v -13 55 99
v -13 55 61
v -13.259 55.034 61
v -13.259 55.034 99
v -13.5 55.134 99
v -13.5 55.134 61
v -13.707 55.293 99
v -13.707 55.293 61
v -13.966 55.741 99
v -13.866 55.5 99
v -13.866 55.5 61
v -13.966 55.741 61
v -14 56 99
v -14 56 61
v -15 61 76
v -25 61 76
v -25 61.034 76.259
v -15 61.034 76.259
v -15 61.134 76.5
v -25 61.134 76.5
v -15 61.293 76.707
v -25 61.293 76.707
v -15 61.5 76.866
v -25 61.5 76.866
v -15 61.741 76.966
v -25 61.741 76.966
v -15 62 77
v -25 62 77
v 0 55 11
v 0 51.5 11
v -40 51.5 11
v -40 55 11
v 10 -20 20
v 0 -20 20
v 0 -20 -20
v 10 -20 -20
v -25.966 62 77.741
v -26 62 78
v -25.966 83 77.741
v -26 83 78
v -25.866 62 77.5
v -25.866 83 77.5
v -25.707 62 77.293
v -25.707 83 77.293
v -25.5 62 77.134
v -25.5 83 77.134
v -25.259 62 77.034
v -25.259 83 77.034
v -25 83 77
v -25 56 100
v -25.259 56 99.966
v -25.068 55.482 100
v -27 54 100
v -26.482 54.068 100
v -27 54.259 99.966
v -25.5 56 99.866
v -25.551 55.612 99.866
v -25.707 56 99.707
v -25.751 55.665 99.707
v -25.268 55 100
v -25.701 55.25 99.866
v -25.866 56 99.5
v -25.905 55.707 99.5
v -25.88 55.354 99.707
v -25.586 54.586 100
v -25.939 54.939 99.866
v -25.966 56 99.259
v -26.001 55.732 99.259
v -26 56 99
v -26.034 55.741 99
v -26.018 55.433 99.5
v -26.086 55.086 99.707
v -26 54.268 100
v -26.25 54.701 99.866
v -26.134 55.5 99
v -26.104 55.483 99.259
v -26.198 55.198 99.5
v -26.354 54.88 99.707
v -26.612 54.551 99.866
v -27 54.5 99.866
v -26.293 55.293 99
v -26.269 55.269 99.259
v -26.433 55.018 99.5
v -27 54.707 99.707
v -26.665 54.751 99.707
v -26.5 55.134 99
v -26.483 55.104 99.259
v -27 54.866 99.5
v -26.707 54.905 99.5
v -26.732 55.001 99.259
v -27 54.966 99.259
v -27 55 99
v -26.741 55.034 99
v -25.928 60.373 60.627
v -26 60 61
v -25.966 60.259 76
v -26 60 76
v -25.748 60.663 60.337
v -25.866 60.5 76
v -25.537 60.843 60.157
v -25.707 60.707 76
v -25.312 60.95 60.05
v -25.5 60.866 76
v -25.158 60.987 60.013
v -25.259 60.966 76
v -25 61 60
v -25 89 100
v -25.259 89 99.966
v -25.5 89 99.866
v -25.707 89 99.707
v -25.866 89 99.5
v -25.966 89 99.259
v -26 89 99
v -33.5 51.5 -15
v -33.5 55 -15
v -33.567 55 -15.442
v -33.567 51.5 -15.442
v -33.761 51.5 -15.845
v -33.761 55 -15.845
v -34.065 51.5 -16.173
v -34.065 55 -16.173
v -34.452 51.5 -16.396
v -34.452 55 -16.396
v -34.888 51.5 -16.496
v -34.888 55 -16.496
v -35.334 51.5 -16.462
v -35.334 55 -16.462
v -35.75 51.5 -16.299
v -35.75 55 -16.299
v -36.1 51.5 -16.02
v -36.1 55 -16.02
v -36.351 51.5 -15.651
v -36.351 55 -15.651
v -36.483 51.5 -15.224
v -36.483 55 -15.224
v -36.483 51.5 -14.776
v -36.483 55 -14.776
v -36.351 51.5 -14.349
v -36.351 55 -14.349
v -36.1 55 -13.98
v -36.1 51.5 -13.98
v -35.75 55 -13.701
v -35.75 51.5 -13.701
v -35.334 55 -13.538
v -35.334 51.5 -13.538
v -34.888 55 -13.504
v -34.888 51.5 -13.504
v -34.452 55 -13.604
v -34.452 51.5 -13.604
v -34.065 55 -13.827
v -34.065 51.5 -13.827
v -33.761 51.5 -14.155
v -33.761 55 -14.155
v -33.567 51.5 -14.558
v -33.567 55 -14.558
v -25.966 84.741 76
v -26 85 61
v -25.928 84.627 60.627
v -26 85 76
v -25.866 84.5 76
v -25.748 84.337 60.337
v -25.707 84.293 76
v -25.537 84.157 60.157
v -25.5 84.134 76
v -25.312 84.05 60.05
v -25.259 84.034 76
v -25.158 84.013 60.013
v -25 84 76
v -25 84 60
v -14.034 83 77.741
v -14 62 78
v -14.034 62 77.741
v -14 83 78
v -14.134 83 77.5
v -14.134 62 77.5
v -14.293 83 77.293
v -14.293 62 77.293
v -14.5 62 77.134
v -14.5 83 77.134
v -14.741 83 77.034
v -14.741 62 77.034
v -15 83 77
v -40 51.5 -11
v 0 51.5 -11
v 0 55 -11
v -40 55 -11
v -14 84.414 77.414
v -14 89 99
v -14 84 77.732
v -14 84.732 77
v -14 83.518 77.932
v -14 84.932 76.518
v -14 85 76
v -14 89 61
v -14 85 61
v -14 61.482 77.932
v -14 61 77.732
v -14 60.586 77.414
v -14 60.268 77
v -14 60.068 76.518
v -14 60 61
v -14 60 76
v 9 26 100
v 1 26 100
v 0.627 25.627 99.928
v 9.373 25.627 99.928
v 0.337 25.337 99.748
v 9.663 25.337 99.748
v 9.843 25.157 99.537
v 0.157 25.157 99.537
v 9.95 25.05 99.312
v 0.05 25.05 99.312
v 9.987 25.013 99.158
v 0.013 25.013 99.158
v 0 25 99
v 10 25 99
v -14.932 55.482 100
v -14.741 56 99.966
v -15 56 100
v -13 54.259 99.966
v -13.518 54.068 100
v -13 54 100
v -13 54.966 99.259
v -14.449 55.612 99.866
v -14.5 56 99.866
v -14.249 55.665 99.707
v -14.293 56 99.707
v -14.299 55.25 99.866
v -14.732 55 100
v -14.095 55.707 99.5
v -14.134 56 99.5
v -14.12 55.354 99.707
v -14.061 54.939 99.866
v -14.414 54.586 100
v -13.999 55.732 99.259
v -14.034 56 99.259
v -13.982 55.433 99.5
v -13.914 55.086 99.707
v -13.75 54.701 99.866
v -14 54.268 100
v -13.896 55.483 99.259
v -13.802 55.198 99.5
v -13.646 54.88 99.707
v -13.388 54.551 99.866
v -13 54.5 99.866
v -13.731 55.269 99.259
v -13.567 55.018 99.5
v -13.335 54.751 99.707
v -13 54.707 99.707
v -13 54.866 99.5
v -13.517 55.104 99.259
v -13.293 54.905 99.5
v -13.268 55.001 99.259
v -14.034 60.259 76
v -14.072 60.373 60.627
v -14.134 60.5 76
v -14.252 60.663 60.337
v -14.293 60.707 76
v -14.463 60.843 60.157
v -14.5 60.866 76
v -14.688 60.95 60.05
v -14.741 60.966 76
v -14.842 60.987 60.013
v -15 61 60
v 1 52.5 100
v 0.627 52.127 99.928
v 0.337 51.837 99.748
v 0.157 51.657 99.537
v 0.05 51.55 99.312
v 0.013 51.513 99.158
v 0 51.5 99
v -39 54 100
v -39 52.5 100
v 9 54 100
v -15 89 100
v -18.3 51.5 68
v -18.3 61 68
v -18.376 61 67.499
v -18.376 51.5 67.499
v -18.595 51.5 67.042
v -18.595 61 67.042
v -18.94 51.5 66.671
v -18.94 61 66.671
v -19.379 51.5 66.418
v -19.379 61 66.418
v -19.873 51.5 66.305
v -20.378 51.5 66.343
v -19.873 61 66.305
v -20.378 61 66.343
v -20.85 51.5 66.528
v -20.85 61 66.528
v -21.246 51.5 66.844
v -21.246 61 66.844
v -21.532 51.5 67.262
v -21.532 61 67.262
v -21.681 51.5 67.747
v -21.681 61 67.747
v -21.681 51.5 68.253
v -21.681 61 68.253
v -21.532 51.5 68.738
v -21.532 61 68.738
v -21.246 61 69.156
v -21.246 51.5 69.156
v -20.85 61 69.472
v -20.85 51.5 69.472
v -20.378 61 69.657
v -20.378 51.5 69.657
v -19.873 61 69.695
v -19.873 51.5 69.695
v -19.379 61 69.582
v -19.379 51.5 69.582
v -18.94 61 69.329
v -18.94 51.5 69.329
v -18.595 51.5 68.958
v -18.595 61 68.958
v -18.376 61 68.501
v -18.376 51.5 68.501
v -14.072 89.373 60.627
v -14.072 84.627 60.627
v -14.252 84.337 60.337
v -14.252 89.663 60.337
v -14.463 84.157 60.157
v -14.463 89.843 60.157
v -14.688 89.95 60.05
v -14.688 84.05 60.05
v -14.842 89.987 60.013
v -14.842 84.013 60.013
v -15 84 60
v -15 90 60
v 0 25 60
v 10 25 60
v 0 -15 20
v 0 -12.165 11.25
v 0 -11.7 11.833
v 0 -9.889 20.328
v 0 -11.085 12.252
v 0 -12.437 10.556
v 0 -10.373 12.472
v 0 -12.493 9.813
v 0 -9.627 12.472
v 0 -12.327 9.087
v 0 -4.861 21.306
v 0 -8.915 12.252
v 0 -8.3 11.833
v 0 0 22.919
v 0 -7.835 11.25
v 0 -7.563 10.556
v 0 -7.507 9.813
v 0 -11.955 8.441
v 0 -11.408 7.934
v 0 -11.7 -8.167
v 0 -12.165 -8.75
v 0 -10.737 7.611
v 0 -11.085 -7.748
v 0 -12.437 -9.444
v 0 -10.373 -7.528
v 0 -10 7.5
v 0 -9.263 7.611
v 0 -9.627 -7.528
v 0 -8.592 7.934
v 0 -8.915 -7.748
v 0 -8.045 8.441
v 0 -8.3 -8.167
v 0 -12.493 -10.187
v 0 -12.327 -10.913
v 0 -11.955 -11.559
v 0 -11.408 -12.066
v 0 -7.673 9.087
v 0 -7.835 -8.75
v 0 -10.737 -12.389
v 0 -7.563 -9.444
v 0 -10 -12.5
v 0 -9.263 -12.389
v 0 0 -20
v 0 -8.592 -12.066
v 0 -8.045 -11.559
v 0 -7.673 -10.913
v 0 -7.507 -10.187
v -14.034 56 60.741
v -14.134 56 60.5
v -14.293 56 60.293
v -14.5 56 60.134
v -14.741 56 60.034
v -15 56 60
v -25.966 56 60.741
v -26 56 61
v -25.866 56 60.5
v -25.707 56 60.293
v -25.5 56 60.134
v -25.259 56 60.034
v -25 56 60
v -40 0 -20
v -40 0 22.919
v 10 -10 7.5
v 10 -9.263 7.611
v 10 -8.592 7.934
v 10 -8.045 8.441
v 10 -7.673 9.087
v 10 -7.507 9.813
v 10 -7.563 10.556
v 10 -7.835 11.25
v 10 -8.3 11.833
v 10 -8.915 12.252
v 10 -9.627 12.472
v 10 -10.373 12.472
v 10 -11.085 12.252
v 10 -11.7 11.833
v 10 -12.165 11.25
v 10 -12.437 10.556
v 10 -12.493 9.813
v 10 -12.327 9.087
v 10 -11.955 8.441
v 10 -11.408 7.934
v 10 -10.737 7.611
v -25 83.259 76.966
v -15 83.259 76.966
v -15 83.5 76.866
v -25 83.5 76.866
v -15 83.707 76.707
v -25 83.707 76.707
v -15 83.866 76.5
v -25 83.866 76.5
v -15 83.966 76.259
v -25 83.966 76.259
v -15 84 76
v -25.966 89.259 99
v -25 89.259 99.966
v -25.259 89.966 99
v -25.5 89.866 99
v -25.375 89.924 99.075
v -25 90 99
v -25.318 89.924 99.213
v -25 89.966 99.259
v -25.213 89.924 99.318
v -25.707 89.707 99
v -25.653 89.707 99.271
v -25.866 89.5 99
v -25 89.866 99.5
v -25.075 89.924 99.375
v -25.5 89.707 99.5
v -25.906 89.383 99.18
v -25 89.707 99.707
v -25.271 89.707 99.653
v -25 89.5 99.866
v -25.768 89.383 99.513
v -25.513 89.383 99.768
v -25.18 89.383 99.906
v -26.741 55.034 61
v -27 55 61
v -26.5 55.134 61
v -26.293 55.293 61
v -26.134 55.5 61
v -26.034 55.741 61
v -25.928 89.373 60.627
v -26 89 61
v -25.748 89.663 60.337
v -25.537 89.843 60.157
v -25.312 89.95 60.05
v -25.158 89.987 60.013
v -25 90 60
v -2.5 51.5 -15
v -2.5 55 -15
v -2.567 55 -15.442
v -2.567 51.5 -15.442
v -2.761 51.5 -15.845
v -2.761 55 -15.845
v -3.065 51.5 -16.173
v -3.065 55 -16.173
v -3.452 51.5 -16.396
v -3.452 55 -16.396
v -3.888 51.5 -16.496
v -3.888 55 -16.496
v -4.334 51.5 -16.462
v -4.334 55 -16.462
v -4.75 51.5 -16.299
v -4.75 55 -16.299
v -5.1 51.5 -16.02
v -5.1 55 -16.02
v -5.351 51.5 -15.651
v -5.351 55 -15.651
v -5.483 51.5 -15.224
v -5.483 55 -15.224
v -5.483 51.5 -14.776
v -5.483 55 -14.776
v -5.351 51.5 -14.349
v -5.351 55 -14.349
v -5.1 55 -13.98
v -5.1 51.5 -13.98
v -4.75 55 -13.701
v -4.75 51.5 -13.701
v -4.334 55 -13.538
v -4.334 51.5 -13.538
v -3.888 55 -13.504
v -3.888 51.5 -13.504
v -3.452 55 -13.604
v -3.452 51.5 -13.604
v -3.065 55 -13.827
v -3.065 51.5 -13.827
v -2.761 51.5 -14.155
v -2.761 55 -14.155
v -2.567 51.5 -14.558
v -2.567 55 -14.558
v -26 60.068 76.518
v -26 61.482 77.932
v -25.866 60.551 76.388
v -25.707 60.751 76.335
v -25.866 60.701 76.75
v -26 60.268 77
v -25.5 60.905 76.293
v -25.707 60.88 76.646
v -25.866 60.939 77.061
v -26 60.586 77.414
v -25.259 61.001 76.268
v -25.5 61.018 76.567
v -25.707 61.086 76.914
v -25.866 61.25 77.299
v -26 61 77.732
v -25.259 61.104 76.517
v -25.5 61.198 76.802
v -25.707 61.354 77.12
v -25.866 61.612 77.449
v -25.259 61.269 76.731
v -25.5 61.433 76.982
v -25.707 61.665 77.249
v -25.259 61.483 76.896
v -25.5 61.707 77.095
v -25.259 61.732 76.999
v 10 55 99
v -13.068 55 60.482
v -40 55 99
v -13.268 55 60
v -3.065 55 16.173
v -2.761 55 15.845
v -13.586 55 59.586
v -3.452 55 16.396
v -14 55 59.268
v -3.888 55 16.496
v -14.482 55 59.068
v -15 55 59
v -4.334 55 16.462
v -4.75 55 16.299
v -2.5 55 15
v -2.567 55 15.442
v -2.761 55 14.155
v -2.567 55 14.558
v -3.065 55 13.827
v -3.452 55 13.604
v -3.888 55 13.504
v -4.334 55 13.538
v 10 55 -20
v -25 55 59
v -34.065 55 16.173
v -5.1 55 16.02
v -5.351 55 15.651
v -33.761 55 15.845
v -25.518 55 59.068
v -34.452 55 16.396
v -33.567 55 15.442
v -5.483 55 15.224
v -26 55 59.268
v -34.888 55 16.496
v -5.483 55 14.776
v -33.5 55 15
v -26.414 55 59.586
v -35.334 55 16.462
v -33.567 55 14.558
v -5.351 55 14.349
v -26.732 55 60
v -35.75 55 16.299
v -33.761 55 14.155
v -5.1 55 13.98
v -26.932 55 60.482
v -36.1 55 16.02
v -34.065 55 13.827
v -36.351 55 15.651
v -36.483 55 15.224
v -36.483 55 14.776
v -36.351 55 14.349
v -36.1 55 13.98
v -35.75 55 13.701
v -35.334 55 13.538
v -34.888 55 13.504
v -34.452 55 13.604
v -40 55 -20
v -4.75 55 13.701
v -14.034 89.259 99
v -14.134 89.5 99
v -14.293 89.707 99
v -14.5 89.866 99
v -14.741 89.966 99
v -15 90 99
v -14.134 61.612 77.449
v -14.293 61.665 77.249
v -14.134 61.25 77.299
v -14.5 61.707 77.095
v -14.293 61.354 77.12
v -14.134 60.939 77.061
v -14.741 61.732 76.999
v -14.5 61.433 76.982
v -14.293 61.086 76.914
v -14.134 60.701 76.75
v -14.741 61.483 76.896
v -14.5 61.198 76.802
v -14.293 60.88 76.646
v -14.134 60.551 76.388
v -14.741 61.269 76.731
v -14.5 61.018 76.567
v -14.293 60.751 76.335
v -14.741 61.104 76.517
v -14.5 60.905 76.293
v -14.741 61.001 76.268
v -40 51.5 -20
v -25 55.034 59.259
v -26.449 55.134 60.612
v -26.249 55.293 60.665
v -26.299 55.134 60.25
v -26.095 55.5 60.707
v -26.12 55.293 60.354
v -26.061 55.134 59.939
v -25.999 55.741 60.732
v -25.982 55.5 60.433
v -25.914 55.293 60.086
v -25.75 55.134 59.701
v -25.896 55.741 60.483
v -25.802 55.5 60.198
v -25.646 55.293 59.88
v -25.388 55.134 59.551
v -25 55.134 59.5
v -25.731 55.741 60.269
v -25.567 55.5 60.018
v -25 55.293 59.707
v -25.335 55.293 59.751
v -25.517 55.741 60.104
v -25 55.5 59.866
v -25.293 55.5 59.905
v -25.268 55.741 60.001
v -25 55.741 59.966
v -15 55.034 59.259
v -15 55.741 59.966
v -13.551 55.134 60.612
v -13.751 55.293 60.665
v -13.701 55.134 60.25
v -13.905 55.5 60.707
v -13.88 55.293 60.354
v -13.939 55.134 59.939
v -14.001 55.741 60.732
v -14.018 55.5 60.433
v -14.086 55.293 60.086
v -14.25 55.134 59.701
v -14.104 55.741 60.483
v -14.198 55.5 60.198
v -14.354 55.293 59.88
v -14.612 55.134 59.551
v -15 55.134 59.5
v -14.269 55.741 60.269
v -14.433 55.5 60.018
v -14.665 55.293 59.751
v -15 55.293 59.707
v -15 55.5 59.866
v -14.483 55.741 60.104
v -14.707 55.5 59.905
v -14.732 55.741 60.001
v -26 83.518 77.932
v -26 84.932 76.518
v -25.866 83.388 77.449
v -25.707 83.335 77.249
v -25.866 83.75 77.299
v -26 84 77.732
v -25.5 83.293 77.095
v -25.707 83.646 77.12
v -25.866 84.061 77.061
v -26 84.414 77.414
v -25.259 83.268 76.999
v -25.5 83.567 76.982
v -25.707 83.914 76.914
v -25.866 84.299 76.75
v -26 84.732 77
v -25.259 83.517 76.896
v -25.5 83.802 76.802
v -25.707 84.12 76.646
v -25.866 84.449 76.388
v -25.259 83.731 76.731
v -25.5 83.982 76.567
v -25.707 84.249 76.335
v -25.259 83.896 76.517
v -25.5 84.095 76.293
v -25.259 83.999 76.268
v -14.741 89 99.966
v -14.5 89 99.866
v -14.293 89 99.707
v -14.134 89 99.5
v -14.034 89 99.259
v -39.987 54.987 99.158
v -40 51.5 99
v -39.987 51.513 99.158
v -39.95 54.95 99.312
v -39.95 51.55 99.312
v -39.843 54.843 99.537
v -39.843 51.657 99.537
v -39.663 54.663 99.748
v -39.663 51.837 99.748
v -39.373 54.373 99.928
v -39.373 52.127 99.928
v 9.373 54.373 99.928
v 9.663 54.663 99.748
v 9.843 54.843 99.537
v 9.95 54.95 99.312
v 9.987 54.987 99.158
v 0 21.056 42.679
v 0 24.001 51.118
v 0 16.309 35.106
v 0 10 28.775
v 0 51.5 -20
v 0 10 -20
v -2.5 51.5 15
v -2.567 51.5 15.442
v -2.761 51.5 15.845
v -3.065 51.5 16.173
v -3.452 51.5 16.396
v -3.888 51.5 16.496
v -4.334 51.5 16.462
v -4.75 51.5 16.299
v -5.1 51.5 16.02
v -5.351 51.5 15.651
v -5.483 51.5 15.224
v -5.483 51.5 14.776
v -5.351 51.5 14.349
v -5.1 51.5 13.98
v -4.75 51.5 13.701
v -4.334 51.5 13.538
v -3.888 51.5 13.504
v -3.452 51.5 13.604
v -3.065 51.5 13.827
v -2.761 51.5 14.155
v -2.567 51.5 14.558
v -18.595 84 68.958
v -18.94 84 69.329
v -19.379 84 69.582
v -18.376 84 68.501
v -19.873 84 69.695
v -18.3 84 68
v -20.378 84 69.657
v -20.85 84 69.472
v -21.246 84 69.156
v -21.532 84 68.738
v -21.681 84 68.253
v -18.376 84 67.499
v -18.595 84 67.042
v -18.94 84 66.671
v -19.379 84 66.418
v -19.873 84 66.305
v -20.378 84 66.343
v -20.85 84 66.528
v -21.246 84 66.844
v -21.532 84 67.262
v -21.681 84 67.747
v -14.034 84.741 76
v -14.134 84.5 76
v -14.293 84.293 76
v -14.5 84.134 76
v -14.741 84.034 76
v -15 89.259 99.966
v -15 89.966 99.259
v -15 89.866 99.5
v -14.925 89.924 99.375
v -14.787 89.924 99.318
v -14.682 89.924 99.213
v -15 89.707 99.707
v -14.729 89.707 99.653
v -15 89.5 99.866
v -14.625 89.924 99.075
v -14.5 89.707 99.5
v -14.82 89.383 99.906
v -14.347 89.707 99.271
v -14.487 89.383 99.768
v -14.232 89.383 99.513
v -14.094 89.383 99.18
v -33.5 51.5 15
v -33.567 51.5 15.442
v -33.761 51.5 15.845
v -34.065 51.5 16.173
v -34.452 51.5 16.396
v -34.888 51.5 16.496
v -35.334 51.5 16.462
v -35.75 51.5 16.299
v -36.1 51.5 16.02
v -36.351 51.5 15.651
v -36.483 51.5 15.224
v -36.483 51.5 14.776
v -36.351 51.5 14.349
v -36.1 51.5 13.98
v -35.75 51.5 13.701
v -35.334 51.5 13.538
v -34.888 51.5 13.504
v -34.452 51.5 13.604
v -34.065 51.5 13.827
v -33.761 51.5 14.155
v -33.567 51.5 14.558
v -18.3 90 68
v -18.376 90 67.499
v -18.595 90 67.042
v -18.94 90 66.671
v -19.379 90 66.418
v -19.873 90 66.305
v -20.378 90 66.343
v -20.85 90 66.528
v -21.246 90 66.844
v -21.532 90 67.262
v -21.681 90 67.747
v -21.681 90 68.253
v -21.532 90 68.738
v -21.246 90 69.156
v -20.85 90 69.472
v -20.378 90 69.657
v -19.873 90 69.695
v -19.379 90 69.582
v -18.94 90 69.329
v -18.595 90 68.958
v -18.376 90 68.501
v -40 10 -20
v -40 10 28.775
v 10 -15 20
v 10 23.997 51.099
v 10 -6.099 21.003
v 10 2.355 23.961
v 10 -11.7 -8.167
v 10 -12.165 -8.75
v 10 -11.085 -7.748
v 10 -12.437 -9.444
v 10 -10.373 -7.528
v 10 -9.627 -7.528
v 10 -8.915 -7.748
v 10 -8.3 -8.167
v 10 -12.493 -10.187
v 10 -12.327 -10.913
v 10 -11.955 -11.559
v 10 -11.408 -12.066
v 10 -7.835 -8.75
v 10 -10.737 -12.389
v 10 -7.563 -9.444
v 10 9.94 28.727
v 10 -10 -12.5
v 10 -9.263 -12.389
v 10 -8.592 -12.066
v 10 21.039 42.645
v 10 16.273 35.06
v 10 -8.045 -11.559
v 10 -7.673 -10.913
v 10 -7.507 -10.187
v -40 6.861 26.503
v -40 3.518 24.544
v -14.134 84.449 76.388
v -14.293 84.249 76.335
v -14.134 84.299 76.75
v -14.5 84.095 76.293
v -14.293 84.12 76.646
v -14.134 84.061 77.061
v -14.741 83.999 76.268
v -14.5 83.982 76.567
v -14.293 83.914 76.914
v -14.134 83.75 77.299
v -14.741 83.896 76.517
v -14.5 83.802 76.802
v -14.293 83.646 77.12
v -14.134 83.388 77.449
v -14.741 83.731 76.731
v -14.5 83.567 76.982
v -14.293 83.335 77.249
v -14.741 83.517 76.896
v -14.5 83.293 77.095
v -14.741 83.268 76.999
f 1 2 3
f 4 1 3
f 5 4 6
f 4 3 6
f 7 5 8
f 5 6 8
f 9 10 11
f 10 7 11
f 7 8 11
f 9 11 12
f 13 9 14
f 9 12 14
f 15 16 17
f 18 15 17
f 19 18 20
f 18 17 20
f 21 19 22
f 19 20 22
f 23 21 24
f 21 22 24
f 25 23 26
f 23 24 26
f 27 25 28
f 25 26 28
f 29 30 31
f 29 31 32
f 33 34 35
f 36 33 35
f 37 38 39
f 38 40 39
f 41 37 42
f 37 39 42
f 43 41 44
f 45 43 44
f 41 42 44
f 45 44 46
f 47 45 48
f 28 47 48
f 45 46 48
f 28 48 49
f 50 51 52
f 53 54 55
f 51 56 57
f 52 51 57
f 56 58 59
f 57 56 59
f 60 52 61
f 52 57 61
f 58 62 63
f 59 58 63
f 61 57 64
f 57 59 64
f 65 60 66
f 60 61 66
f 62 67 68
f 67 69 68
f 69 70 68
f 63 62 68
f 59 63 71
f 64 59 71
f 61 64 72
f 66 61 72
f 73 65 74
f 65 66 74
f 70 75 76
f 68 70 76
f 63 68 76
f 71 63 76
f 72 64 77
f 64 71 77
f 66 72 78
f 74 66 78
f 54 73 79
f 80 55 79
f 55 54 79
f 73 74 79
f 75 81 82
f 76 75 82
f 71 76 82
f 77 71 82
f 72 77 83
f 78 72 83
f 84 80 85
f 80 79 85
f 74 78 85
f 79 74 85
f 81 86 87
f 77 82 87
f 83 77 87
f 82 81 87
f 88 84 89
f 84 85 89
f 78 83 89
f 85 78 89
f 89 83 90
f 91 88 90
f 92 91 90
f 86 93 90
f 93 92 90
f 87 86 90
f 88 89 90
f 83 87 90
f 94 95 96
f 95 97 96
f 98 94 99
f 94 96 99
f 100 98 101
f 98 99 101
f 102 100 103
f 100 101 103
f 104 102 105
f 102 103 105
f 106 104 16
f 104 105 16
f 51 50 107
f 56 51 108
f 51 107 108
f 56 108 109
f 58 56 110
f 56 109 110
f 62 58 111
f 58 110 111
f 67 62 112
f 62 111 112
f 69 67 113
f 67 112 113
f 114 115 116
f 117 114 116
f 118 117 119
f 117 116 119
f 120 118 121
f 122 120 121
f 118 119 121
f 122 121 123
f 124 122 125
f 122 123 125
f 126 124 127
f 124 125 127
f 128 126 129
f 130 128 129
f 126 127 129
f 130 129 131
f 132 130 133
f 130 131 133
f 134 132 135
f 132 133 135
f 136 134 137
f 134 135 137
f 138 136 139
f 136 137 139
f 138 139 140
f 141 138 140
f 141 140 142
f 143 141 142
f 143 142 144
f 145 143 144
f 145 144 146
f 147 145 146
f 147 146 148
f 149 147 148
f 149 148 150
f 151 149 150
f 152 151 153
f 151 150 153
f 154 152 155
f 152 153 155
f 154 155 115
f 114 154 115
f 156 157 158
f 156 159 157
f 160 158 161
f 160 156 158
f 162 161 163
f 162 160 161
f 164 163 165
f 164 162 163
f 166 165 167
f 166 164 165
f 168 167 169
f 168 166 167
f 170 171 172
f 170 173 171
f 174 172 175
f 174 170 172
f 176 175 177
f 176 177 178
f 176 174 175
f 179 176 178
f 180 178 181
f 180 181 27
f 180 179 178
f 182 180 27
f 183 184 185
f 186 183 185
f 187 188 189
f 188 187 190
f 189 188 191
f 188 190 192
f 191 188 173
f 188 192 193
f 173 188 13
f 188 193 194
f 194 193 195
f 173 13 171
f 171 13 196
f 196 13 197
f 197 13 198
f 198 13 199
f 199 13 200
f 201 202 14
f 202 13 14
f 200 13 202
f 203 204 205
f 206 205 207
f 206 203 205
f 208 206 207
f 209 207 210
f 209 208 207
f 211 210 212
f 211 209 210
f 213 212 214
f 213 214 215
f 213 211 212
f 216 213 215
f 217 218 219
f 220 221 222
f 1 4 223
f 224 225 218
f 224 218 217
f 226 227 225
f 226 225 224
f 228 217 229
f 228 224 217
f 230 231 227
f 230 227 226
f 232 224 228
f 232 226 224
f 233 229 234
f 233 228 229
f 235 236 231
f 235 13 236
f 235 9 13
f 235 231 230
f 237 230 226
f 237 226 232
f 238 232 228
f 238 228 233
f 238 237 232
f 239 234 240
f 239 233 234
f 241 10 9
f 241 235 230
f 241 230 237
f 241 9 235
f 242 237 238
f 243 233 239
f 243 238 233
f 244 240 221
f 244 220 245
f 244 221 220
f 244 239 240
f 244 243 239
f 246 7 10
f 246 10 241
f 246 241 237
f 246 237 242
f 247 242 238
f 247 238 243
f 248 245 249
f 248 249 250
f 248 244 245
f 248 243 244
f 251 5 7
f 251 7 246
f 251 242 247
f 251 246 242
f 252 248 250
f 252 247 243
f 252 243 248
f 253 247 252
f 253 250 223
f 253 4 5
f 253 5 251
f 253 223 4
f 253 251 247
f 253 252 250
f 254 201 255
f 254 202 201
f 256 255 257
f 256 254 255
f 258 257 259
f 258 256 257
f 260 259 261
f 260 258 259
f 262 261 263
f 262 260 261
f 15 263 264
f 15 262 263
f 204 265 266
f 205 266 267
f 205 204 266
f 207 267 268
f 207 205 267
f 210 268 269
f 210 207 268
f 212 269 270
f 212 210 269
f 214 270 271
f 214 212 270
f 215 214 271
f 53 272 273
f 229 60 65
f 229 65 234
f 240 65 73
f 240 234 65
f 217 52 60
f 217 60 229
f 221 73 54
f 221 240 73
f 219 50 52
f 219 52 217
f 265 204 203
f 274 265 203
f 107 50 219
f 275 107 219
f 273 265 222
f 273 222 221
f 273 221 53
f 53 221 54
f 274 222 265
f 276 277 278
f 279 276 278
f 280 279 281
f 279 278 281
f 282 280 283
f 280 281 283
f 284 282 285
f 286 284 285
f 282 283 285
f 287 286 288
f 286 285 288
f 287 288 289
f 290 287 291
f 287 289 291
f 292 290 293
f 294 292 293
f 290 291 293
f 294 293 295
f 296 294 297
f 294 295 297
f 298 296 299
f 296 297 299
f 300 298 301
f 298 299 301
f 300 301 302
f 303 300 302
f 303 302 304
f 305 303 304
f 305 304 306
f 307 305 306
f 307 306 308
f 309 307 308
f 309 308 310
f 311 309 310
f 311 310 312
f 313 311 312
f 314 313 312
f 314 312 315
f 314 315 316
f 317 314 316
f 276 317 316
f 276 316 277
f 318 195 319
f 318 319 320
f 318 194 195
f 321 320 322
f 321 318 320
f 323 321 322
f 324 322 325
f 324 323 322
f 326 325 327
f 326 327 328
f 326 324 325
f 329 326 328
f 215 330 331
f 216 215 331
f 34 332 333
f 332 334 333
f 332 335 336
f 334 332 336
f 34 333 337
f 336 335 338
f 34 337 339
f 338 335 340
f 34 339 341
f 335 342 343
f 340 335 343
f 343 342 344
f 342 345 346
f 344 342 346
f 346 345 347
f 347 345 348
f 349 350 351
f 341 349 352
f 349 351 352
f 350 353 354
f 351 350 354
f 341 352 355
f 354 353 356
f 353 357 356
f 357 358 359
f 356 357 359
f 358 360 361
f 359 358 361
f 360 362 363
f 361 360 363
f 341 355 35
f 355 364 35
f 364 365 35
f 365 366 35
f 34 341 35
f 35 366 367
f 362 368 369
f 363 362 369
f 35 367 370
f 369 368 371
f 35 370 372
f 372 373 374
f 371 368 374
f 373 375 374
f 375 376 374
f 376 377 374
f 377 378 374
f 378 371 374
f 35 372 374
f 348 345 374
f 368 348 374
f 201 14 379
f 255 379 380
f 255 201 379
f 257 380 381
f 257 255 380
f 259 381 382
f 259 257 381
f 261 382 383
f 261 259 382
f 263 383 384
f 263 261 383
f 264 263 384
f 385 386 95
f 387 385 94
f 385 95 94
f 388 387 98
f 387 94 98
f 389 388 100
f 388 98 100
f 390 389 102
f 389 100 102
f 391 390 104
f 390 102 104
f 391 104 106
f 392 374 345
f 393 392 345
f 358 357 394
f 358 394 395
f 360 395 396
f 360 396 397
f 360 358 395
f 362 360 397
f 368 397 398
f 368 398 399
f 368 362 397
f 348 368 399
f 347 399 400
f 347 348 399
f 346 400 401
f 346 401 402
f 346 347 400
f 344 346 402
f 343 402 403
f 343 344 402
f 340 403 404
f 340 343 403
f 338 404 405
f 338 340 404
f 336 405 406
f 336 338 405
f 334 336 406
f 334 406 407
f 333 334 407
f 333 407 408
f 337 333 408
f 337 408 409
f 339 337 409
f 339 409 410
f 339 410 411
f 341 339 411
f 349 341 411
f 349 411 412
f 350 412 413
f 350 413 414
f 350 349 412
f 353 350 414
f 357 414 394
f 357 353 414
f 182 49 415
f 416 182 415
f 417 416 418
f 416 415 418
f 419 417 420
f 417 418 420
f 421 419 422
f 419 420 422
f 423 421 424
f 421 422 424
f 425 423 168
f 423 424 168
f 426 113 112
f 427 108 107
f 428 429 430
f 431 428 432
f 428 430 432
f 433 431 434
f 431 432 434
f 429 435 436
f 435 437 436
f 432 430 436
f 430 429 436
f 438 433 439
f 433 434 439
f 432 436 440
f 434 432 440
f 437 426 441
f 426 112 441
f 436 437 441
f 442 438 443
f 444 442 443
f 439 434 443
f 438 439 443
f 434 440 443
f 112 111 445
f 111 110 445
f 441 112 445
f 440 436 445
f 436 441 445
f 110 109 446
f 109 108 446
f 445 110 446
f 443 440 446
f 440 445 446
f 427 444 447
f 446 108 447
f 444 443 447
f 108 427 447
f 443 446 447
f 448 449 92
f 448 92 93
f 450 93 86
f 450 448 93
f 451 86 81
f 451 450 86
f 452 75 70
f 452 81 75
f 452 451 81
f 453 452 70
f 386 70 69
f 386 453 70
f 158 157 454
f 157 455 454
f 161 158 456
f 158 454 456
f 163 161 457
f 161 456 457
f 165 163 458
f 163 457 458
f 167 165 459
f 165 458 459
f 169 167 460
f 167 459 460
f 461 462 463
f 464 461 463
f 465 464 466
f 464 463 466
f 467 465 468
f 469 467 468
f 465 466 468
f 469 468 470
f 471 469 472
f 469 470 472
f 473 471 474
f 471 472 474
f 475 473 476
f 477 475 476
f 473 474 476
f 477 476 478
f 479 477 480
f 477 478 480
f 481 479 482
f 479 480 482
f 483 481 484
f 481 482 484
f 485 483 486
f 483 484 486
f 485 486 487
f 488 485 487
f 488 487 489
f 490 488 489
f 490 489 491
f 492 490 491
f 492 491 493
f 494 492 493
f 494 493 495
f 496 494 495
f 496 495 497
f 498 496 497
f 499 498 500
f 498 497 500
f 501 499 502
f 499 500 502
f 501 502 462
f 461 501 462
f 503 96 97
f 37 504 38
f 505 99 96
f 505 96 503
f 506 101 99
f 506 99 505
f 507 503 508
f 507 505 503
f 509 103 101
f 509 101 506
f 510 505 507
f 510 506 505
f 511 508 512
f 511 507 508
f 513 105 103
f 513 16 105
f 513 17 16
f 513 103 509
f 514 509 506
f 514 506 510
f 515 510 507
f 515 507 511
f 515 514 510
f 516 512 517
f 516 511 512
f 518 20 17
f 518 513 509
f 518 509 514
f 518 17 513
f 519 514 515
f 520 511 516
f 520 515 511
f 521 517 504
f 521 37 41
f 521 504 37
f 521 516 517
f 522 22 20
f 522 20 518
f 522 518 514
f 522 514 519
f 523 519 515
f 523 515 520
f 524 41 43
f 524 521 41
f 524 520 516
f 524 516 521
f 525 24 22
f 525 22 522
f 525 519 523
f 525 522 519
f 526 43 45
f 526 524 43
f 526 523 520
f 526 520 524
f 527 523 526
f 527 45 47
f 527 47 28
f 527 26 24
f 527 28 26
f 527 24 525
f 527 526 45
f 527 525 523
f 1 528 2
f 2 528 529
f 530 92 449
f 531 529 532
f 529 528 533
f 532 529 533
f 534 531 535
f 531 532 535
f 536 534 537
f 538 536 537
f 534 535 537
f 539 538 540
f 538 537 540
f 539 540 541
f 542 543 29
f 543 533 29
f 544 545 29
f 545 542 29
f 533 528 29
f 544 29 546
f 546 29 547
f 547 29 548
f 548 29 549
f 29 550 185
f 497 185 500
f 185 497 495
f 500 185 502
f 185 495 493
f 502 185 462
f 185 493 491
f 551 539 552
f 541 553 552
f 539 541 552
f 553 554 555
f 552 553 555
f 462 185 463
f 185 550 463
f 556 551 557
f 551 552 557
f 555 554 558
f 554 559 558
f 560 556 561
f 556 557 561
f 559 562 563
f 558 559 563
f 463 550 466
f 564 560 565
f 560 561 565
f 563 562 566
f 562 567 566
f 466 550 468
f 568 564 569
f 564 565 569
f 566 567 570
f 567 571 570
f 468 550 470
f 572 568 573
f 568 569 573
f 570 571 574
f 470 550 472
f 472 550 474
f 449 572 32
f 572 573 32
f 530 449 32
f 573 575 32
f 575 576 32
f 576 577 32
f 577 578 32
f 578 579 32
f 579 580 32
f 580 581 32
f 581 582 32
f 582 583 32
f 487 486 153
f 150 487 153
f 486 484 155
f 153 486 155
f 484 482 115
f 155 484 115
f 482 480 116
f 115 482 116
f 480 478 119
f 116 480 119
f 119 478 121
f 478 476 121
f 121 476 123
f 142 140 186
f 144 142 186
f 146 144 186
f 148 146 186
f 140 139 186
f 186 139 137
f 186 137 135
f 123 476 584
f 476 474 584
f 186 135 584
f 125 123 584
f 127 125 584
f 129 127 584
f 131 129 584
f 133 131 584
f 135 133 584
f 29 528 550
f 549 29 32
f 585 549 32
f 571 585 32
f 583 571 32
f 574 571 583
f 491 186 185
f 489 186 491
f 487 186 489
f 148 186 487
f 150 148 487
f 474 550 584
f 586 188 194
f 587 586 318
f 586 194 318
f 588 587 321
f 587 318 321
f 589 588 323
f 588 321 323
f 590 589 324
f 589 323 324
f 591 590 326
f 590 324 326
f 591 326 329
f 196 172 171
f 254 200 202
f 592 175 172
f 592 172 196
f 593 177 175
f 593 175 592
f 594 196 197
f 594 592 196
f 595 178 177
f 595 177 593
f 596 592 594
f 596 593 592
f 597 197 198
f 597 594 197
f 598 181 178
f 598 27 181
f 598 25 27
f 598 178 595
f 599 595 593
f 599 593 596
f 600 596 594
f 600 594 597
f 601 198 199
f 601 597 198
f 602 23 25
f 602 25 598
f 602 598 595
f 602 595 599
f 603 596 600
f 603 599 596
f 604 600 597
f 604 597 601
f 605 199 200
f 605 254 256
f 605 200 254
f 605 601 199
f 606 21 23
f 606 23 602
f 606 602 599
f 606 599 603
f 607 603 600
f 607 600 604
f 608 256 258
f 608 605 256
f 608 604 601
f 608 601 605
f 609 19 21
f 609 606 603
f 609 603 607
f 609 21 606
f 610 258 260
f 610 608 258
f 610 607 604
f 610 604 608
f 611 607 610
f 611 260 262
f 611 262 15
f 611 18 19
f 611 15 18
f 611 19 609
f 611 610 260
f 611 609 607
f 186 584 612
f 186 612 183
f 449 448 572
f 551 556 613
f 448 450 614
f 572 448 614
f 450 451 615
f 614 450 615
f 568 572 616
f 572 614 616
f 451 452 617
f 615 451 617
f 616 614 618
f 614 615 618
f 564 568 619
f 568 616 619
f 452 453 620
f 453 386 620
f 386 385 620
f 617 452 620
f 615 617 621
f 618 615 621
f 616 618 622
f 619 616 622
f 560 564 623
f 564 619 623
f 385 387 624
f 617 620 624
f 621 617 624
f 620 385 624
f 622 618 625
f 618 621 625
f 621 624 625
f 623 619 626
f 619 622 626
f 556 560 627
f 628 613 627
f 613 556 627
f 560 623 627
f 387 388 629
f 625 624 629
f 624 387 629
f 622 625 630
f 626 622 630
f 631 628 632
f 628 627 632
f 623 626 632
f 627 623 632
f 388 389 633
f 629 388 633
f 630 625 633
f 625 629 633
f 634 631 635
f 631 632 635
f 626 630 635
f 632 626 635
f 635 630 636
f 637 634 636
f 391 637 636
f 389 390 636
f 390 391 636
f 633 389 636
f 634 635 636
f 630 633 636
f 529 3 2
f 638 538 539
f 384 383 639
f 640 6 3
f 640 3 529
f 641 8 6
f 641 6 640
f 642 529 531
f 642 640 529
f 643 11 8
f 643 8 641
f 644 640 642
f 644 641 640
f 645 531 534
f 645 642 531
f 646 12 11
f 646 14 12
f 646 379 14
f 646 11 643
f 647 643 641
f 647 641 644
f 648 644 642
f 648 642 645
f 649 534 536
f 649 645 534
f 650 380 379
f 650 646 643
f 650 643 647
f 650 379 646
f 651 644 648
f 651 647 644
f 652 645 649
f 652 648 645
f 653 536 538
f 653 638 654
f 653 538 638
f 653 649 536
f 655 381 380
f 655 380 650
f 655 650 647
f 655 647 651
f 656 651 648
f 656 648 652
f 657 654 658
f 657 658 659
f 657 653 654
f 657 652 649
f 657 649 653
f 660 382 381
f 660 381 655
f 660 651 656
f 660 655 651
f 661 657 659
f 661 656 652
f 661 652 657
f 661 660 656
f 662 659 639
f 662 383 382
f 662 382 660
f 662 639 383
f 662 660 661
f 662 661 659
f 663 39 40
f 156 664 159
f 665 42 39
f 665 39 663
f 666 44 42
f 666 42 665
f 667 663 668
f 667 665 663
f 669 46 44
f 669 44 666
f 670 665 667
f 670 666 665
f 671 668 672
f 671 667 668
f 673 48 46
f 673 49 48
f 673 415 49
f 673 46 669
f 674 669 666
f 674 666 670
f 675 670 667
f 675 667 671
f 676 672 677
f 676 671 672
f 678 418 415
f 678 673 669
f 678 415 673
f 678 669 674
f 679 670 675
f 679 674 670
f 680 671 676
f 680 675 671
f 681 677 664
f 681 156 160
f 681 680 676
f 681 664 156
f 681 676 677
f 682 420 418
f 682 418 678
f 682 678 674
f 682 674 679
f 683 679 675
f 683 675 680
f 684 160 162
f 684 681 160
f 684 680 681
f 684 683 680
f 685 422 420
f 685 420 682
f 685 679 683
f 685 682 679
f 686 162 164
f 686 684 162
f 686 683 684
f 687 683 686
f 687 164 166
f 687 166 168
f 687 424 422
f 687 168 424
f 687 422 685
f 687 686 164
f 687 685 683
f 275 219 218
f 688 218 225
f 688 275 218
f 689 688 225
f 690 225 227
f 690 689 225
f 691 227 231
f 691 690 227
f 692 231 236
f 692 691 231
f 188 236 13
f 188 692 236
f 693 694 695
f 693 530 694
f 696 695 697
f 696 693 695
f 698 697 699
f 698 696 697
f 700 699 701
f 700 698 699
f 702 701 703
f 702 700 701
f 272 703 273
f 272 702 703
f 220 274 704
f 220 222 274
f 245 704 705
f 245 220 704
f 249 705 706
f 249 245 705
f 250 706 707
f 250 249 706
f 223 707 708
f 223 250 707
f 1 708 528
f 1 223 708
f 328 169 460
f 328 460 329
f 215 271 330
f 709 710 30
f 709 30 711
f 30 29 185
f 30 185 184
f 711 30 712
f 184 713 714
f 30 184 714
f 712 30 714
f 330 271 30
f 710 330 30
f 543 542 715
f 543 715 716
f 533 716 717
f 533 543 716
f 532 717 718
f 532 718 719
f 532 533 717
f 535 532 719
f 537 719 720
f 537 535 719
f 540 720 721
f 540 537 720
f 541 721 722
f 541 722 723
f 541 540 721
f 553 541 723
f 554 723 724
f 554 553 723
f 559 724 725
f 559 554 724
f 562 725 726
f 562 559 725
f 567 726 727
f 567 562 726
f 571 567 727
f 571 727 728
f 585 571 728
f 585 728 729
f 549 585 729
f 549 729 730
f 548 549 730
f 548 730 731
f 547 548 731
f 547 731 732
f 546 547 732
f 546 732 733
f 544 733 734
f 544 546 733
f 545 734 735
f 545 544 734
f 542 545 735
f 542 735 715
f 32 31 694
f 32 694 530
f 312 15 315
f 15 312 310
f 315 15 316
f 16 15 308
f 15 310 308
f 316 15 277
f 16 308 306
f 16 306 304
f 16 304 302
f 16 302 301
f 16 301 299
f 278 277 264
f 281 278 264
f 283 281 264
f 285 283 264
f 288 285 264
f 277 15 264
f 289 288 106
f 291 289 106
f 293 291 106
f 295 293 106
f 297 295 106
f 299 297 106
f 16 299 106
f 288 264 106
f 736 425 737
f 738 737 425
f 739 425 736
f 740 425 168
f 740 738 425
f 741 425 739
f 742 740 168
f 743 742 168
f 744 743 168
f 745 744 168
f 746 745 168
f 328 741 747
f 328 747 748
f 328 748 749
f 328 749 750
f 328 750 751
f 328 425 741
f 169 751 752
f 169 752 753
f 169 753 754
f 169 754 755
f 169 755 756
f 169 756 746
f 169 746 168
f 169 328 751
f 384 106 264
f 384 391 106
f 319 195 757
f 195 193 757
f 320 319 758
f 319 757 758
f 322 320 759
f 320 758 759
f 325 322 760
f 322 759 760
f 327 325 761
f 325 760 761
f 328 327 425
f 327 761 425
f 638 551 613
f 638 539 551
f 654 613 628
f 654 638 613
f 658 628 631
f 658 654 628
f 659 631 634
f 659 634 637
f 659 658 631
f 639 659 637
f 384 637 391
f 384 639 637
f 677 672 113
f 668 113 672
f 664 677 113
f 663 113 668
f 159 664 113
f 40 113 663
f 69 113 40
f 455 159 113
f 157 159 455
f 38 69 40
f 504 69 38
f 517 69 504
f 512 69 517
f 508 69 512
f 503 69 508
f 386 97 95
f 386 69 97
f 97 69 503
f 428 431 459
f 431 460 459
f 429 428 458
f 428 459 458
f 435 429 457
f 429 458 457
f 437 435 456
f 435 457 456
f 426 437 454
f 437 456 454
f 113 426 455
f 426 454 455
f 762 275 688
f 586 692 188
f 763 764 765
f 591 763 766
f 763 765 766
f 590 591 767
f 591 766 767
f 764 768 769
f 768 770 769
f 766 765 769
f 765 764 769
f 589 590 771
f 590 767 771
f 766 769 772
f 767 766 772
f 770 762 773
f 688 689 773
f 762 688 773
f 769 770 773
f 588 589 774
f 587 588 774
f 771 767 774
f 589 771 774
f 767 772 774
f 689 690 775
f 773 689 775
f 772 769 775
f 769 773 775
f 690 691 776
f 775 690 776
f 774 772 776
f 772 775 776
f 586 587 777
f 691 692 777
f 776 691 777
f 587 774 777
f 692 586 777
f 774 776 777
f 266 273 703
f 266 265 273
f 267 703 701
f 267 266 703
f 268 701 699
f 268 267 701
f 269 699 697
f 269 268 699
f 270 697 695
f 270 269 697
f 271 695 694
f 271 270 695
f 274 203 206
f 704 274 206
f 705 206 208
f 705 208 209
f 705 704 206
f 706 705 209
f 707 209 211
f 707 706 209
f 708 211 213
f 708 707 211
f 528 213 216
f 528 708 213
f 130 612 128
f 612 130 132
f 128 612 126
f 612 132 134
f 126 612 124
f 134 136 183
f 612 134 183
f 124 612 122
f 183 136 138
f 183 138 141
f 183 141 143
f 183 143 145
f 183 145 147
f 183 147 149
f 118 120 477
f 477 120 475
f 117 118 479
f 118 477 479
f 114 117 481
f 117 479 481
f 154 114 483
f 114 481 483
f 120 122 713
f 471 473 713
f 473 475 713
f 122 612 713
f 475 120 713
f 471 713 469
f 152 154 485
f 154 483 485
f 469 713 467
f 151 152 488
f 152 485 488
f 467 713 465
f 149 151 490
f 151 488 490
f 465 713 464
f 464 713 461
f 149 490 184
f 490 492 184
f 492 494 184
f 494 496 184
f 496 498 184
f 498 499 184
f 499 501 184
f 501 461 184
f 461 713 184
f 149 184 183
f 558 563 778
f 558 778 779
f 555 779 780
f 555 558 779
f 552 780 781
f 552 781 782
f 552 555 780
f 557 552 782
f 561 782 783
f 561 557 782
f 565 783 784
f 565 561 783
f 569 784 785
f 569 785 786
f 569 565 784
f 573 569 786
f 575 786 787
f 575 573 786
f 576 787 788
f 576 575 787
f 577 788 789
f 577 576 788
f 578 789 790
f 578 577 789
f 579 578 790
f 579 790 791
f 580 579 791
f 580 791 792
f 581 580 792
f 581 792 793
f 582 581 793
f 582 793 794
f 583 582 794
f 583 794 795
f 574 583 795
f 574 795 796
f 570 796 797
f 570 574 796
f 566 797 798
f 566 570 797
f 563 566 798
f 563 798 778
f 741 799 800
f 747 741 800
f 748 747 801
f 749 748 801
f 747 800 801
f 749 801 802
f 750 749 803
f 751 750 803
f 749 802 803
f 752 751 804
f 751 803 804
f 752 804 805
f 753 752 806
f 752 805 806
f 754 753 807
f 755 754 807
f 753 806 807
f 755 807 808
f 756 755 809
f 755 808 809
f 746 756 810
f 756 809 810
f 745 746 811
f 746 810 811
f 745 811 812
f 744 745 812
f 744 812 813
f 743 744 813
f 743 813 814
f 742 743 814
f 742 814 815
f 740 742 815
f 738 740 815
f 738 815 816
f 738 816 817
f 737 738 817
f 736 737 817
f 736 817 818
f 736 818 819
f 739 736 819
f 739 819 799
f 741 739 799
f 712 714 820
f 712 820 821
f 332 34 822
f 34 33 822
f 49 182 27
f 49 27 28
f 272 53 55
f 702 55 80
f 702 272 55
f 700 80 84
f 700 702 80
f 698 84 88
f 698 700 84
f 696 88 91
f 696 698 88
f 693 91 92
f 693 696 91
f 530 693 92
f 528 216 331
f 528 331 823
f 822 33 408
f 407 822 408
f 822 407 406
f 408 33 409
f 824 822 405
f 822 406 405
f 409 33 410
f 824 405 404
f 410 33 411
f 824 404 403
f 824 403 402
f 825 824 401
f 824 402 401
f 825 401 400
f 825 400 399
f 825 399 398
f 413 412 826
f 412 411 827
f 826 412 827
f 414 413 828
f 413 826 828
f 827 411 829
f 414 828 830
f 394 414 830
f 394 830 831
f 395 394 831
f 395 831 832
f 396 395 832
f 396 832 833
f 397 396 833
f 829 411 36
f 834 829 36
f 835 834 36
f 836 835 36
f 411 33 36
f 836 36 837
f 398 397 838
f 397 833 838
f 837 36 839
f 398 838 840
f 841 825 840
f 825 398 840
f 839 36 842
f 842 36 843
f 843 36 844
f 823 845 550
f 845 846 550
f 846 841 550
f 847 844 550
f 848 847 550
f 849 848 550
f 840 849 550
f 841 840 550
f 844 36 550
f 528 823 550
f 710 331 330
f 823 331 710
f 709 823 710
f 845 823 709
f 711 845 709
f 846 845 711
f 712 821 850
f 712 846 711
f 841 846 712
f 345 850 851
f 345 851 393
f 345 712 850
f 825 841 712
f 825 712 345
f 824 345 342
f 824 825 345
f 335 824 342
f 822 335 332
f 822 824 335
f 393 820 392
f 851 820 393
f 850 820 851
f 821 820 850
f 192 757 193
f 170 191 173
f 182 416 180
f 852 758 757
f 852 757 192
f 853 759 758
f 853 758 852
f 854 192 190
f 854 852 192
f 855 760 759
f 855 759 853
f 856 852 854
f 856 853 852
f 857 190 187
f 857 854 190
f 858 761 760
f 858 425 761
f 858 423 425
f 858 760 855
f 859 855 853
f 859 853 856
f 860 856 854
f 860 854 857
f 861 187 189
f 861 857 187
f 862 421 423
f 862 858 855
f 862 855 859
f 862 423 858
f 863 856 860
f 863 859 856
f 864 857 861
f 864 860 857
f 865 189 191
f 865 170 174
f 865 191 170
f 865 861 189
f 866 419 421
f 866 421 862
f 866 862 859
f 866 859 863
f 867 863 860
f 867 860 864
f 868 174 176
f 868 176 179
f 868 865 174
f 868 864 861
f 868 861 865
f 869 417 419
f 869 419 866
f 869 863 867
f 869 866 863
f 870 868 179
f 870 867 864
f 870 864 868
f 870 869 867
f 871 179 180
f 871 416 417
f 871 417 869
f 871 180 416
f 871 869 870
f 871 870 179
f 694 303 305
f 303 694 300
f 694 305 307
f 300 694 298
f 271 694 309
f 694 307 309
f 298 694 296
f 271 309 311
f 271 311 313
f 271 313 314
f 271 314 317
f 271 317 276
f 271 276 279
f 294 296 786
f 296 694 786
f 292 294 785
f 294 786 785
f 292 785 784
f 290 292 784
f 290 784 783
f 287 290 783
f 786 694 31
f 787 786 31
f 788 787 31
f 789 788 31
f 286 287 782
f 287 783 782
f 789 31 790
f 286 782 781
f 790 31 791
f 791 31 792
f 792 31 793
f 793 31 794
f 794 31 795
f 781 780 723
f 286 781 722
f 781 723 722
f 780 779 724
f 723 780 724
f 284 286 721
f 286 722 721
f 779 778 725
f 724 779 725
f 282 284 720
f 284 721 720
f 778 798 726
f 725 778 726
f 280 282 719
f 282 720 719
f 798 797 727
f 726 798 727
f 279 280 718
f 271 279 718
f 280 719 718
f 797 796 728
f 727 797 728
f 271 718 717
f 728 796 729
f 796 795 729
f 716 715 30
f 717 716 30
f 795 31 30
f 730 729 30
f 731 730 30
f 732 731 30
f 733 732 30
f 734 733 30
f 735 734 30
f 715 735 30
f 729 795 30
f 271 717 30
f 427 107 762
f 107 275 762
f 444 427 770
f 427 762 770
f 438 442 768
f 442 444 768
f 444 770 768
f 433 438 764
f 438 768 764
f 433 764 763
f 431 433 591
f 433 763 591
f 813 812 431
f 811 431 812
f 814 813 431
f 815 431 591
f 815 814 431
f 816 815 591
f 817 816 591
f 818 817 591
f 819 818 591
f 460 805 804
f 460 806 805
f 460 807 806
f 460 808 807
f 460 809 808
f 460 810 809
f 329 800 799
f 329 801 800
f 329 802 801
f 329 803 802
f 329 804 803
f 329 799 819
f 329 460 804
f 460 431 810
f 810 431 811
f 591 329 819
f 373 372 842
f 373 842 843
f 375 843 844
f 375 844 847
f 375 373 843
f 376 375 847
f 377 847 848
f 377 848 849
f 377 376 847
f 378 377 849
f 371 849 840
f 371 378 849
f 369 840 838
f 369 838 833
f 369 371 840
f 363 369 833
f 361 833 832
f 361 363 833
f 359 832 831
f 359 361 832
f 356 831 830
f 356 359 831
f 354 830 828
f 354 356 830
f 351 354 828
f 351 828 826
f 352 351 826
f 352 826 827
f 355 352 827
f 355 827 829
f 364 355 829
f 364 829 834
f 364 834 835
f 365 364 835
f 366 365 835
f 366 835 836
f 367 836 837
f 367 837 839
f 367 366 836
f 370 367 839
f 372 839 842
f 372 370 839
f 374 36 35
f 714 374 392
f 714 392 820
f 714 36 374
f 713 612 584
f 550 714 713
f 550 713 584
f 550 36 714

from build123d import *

# Parameters (mm, degrees)
SKETCH1_W               = 40
SKETCH1_H               = 55
SKETCH1_H_2             = 20
SKETCH1_R               = 2.5
BOSS_EXTRUDE1_DEPTH     = 10
SKETCH3_W               = 40
SKETCH3_H               = 10
BOSS_EXTRUDE2_DEPTH     = 40
SKETCH4_W               = 9
SKETCH4_H               = 3.5
BOSS_EXTRUDE3_DEPTH     = 40
SKETCH5_R               = 1.5
CUT_EXTRUDE1_DEPTH      = 3.5
SKETCH7_W               = 40
SKETCH7_H               = 3.5
BOSS_EXTRUDE4_DEPTH     = 80
SKETCH8_W               = 12
SKETCH8_H               = 40
BOSS_EXTRUDE5_DEPTH     = 35
SKETCH9_W               = 12
SKETCH9_H               = 23
CUT_EXTRUDE2_DEPTH      = 17
SKETCH10_R              = 1.7
CUT_EXTRUDE3_DEPTH      = 1
CUT_EXTRUDE3_DEPTH_BACK = 38.5
FILLET1_R               = 1
FILLET2_R               = 40


with BuildPart() as part:
    # Sketch1 → Boss-Extrude1 (new body)
    with BuildSketch(Plane(origin=(0, 0, 0), x_dir=(0, 0, -1), z_dir=(1, 0, 0))):
        with Locations((0, 27.5)):
            Rectangle(SKETCH1_W, SKETCH1_H)
        with Locations((0, -10)):
            Rectangle(SKETCH1_W, SKETCH1_H_2)
        with Locations((10, -10)):
            Circle(SKETCH1_R, mode=Mode.SUBTRACT)
        with Locations((-10, -10)):
            Circle(SKETCH1_R, mode=Mode.SUBTRACT)
    extrude(amount=BOSS_EXTRUDE1_DEPTH)

    # Sketch3 → Boss-Extrude2 (add)
    with BuildSketch(Plane.ZY):
        with Locations((0, 5)):
            Rectangle(SKETCH3_W, SKETCH3_H)
    extrude(amount=BOSS_EXTRUDE2_DEPTH)

    # Sketch4 → Boss-Extrude3 (add)
    with BuildSketch(Plane.ZY):
        with Locations((-15.5, 53.25)):
            Rectangle(SKETCH4_W, SKETCH4_H)
    boss_extrude3 = extrude(amount=BOSS_EXTRUDE3_DEPTH)

    # Sketch5 → Cut-Extrude1 (cut)
    with BuildSketch(Plane(origin=(0, 55, 0), x_dir=(1, 0, 0), z_dir=(0, 1, 0))):
        with Locations((-35, 15)):
            Circle(SKETCH5_R)
        with Locations((-4, 15)):
            Circle(SKETCH5_R)
    cut_extrude1 = extrude(amount=-CUT_EXTRUDE1_DEPTH, mode=Mode.SUBTRACT)

    # Mirror2: Boss-Extrude3, Cut-Extrude1 across plane
    add(boss_extrude3.mirror(Plane.XY))
    add(cut_extrude1.mirror(Plane.XY), mode=Mode.SUBTRACT)

    # Sketch7 → Boss-Extrude4 (add)
    with BuildSketch(Plane.XY.offset(20)):
        with Locations((-20, 53.25)):
            Rectangle(SKETCH7_W, SKETCH7_H)
        Polygon((10, 55), (0, 55), (0, 51.5), (0, 25), (10, 25), align=None)
    extrude(amount=BOSS_EXTRUDE4_DEPTH)

    # Sketch8 → Boss-Extrude5 (add)
    with BuildSketch(Plane(origin=(0, 55, 0), x_dir=(1, 0, 0), z_dir=(0, 1, 0))):
        with Locations((-20, -80)):
            Rectangle(SKETCH8_W, SKETCH8_H)
    extrude(amount=BOSS_EXTRUDE5_DEPTH)

    # Sketch9 → Cut-Extrude2 (cut)
    with BuildSketch(Plane(origin=(0, 0, 60), x_dir=(-1, 0, 0), z_dir=(0, 0, -1))):
        with Locations((20, 72.5)):
            Rectangle(SKETCH9_W, SKETCH9_H)
    extrude(amount=-CUT_EXTRUDE2_DEPTH, mode=Mode.SUBTRACT)

    # Sketch10 → Cut-Extrude3 (cut, two sides)
    with BuildSketch(Plane(origin=(0, 90, 0), x_dir=(1, 0, 0), z_dir=(0, 1, 0))) as cut_extrude3_sk:
        with Locations((-20, -68)):
            Circle(SKETCH10_R)
    extrude(amount=CUT_EXTRUDE3_DEPTH, mode=Mode.SUBTRACT)
    extrude(cut_extrude3_sk.sketch, amount=-CUT_EXTRUDE3_DEPTH_BACK, mode=Mode.SUBTRACT)

    # Fillet1
    fillet1_edges = [part.edges().sort_by_distance(p)[0] for p in [
        (-33, 55, 100),
        (-26, 55, 80),
        (-26, 87, 60),
        (-26, 72.5, 100),
        (-14, 55, 80),
        (-14, 72.5, 100),
        (-20, 55, 60),
        (-14, 87, 60),
        (-26, 90, 80),
        (-20, 90, 100),
        (-14, 90, 80),
        (-26, 58, 60),
        (-14, 58, 60),
        (-14, 72.5, 77),
        (-14, 61, 68.5),
        (-20, 84, 77),
        (-14, 84, 68.5),
        (-26, 72.5, 77),
        (-26, 84, 68.5),
        (-20, 61, 77),
        (-26, 61, 68.5),
        (-20, 51.5, 100),
        (0, 38.25, 100),
        (5, 25, 100),
        (10, 40, 100),
        (-2, 55, 100),
        (-40, 53.25, 100),
    ]]
    fillet(fillet1_edges, radius=FILLET1_R)

    # Fillet2
    fillet2_edges = [part.edges().sort_by_distance(p)[0] for p in [
        (5, 25, 20),
    ]]
    fillet(fillet2_edges, radius=FILLET2_R)


solid = part.part
